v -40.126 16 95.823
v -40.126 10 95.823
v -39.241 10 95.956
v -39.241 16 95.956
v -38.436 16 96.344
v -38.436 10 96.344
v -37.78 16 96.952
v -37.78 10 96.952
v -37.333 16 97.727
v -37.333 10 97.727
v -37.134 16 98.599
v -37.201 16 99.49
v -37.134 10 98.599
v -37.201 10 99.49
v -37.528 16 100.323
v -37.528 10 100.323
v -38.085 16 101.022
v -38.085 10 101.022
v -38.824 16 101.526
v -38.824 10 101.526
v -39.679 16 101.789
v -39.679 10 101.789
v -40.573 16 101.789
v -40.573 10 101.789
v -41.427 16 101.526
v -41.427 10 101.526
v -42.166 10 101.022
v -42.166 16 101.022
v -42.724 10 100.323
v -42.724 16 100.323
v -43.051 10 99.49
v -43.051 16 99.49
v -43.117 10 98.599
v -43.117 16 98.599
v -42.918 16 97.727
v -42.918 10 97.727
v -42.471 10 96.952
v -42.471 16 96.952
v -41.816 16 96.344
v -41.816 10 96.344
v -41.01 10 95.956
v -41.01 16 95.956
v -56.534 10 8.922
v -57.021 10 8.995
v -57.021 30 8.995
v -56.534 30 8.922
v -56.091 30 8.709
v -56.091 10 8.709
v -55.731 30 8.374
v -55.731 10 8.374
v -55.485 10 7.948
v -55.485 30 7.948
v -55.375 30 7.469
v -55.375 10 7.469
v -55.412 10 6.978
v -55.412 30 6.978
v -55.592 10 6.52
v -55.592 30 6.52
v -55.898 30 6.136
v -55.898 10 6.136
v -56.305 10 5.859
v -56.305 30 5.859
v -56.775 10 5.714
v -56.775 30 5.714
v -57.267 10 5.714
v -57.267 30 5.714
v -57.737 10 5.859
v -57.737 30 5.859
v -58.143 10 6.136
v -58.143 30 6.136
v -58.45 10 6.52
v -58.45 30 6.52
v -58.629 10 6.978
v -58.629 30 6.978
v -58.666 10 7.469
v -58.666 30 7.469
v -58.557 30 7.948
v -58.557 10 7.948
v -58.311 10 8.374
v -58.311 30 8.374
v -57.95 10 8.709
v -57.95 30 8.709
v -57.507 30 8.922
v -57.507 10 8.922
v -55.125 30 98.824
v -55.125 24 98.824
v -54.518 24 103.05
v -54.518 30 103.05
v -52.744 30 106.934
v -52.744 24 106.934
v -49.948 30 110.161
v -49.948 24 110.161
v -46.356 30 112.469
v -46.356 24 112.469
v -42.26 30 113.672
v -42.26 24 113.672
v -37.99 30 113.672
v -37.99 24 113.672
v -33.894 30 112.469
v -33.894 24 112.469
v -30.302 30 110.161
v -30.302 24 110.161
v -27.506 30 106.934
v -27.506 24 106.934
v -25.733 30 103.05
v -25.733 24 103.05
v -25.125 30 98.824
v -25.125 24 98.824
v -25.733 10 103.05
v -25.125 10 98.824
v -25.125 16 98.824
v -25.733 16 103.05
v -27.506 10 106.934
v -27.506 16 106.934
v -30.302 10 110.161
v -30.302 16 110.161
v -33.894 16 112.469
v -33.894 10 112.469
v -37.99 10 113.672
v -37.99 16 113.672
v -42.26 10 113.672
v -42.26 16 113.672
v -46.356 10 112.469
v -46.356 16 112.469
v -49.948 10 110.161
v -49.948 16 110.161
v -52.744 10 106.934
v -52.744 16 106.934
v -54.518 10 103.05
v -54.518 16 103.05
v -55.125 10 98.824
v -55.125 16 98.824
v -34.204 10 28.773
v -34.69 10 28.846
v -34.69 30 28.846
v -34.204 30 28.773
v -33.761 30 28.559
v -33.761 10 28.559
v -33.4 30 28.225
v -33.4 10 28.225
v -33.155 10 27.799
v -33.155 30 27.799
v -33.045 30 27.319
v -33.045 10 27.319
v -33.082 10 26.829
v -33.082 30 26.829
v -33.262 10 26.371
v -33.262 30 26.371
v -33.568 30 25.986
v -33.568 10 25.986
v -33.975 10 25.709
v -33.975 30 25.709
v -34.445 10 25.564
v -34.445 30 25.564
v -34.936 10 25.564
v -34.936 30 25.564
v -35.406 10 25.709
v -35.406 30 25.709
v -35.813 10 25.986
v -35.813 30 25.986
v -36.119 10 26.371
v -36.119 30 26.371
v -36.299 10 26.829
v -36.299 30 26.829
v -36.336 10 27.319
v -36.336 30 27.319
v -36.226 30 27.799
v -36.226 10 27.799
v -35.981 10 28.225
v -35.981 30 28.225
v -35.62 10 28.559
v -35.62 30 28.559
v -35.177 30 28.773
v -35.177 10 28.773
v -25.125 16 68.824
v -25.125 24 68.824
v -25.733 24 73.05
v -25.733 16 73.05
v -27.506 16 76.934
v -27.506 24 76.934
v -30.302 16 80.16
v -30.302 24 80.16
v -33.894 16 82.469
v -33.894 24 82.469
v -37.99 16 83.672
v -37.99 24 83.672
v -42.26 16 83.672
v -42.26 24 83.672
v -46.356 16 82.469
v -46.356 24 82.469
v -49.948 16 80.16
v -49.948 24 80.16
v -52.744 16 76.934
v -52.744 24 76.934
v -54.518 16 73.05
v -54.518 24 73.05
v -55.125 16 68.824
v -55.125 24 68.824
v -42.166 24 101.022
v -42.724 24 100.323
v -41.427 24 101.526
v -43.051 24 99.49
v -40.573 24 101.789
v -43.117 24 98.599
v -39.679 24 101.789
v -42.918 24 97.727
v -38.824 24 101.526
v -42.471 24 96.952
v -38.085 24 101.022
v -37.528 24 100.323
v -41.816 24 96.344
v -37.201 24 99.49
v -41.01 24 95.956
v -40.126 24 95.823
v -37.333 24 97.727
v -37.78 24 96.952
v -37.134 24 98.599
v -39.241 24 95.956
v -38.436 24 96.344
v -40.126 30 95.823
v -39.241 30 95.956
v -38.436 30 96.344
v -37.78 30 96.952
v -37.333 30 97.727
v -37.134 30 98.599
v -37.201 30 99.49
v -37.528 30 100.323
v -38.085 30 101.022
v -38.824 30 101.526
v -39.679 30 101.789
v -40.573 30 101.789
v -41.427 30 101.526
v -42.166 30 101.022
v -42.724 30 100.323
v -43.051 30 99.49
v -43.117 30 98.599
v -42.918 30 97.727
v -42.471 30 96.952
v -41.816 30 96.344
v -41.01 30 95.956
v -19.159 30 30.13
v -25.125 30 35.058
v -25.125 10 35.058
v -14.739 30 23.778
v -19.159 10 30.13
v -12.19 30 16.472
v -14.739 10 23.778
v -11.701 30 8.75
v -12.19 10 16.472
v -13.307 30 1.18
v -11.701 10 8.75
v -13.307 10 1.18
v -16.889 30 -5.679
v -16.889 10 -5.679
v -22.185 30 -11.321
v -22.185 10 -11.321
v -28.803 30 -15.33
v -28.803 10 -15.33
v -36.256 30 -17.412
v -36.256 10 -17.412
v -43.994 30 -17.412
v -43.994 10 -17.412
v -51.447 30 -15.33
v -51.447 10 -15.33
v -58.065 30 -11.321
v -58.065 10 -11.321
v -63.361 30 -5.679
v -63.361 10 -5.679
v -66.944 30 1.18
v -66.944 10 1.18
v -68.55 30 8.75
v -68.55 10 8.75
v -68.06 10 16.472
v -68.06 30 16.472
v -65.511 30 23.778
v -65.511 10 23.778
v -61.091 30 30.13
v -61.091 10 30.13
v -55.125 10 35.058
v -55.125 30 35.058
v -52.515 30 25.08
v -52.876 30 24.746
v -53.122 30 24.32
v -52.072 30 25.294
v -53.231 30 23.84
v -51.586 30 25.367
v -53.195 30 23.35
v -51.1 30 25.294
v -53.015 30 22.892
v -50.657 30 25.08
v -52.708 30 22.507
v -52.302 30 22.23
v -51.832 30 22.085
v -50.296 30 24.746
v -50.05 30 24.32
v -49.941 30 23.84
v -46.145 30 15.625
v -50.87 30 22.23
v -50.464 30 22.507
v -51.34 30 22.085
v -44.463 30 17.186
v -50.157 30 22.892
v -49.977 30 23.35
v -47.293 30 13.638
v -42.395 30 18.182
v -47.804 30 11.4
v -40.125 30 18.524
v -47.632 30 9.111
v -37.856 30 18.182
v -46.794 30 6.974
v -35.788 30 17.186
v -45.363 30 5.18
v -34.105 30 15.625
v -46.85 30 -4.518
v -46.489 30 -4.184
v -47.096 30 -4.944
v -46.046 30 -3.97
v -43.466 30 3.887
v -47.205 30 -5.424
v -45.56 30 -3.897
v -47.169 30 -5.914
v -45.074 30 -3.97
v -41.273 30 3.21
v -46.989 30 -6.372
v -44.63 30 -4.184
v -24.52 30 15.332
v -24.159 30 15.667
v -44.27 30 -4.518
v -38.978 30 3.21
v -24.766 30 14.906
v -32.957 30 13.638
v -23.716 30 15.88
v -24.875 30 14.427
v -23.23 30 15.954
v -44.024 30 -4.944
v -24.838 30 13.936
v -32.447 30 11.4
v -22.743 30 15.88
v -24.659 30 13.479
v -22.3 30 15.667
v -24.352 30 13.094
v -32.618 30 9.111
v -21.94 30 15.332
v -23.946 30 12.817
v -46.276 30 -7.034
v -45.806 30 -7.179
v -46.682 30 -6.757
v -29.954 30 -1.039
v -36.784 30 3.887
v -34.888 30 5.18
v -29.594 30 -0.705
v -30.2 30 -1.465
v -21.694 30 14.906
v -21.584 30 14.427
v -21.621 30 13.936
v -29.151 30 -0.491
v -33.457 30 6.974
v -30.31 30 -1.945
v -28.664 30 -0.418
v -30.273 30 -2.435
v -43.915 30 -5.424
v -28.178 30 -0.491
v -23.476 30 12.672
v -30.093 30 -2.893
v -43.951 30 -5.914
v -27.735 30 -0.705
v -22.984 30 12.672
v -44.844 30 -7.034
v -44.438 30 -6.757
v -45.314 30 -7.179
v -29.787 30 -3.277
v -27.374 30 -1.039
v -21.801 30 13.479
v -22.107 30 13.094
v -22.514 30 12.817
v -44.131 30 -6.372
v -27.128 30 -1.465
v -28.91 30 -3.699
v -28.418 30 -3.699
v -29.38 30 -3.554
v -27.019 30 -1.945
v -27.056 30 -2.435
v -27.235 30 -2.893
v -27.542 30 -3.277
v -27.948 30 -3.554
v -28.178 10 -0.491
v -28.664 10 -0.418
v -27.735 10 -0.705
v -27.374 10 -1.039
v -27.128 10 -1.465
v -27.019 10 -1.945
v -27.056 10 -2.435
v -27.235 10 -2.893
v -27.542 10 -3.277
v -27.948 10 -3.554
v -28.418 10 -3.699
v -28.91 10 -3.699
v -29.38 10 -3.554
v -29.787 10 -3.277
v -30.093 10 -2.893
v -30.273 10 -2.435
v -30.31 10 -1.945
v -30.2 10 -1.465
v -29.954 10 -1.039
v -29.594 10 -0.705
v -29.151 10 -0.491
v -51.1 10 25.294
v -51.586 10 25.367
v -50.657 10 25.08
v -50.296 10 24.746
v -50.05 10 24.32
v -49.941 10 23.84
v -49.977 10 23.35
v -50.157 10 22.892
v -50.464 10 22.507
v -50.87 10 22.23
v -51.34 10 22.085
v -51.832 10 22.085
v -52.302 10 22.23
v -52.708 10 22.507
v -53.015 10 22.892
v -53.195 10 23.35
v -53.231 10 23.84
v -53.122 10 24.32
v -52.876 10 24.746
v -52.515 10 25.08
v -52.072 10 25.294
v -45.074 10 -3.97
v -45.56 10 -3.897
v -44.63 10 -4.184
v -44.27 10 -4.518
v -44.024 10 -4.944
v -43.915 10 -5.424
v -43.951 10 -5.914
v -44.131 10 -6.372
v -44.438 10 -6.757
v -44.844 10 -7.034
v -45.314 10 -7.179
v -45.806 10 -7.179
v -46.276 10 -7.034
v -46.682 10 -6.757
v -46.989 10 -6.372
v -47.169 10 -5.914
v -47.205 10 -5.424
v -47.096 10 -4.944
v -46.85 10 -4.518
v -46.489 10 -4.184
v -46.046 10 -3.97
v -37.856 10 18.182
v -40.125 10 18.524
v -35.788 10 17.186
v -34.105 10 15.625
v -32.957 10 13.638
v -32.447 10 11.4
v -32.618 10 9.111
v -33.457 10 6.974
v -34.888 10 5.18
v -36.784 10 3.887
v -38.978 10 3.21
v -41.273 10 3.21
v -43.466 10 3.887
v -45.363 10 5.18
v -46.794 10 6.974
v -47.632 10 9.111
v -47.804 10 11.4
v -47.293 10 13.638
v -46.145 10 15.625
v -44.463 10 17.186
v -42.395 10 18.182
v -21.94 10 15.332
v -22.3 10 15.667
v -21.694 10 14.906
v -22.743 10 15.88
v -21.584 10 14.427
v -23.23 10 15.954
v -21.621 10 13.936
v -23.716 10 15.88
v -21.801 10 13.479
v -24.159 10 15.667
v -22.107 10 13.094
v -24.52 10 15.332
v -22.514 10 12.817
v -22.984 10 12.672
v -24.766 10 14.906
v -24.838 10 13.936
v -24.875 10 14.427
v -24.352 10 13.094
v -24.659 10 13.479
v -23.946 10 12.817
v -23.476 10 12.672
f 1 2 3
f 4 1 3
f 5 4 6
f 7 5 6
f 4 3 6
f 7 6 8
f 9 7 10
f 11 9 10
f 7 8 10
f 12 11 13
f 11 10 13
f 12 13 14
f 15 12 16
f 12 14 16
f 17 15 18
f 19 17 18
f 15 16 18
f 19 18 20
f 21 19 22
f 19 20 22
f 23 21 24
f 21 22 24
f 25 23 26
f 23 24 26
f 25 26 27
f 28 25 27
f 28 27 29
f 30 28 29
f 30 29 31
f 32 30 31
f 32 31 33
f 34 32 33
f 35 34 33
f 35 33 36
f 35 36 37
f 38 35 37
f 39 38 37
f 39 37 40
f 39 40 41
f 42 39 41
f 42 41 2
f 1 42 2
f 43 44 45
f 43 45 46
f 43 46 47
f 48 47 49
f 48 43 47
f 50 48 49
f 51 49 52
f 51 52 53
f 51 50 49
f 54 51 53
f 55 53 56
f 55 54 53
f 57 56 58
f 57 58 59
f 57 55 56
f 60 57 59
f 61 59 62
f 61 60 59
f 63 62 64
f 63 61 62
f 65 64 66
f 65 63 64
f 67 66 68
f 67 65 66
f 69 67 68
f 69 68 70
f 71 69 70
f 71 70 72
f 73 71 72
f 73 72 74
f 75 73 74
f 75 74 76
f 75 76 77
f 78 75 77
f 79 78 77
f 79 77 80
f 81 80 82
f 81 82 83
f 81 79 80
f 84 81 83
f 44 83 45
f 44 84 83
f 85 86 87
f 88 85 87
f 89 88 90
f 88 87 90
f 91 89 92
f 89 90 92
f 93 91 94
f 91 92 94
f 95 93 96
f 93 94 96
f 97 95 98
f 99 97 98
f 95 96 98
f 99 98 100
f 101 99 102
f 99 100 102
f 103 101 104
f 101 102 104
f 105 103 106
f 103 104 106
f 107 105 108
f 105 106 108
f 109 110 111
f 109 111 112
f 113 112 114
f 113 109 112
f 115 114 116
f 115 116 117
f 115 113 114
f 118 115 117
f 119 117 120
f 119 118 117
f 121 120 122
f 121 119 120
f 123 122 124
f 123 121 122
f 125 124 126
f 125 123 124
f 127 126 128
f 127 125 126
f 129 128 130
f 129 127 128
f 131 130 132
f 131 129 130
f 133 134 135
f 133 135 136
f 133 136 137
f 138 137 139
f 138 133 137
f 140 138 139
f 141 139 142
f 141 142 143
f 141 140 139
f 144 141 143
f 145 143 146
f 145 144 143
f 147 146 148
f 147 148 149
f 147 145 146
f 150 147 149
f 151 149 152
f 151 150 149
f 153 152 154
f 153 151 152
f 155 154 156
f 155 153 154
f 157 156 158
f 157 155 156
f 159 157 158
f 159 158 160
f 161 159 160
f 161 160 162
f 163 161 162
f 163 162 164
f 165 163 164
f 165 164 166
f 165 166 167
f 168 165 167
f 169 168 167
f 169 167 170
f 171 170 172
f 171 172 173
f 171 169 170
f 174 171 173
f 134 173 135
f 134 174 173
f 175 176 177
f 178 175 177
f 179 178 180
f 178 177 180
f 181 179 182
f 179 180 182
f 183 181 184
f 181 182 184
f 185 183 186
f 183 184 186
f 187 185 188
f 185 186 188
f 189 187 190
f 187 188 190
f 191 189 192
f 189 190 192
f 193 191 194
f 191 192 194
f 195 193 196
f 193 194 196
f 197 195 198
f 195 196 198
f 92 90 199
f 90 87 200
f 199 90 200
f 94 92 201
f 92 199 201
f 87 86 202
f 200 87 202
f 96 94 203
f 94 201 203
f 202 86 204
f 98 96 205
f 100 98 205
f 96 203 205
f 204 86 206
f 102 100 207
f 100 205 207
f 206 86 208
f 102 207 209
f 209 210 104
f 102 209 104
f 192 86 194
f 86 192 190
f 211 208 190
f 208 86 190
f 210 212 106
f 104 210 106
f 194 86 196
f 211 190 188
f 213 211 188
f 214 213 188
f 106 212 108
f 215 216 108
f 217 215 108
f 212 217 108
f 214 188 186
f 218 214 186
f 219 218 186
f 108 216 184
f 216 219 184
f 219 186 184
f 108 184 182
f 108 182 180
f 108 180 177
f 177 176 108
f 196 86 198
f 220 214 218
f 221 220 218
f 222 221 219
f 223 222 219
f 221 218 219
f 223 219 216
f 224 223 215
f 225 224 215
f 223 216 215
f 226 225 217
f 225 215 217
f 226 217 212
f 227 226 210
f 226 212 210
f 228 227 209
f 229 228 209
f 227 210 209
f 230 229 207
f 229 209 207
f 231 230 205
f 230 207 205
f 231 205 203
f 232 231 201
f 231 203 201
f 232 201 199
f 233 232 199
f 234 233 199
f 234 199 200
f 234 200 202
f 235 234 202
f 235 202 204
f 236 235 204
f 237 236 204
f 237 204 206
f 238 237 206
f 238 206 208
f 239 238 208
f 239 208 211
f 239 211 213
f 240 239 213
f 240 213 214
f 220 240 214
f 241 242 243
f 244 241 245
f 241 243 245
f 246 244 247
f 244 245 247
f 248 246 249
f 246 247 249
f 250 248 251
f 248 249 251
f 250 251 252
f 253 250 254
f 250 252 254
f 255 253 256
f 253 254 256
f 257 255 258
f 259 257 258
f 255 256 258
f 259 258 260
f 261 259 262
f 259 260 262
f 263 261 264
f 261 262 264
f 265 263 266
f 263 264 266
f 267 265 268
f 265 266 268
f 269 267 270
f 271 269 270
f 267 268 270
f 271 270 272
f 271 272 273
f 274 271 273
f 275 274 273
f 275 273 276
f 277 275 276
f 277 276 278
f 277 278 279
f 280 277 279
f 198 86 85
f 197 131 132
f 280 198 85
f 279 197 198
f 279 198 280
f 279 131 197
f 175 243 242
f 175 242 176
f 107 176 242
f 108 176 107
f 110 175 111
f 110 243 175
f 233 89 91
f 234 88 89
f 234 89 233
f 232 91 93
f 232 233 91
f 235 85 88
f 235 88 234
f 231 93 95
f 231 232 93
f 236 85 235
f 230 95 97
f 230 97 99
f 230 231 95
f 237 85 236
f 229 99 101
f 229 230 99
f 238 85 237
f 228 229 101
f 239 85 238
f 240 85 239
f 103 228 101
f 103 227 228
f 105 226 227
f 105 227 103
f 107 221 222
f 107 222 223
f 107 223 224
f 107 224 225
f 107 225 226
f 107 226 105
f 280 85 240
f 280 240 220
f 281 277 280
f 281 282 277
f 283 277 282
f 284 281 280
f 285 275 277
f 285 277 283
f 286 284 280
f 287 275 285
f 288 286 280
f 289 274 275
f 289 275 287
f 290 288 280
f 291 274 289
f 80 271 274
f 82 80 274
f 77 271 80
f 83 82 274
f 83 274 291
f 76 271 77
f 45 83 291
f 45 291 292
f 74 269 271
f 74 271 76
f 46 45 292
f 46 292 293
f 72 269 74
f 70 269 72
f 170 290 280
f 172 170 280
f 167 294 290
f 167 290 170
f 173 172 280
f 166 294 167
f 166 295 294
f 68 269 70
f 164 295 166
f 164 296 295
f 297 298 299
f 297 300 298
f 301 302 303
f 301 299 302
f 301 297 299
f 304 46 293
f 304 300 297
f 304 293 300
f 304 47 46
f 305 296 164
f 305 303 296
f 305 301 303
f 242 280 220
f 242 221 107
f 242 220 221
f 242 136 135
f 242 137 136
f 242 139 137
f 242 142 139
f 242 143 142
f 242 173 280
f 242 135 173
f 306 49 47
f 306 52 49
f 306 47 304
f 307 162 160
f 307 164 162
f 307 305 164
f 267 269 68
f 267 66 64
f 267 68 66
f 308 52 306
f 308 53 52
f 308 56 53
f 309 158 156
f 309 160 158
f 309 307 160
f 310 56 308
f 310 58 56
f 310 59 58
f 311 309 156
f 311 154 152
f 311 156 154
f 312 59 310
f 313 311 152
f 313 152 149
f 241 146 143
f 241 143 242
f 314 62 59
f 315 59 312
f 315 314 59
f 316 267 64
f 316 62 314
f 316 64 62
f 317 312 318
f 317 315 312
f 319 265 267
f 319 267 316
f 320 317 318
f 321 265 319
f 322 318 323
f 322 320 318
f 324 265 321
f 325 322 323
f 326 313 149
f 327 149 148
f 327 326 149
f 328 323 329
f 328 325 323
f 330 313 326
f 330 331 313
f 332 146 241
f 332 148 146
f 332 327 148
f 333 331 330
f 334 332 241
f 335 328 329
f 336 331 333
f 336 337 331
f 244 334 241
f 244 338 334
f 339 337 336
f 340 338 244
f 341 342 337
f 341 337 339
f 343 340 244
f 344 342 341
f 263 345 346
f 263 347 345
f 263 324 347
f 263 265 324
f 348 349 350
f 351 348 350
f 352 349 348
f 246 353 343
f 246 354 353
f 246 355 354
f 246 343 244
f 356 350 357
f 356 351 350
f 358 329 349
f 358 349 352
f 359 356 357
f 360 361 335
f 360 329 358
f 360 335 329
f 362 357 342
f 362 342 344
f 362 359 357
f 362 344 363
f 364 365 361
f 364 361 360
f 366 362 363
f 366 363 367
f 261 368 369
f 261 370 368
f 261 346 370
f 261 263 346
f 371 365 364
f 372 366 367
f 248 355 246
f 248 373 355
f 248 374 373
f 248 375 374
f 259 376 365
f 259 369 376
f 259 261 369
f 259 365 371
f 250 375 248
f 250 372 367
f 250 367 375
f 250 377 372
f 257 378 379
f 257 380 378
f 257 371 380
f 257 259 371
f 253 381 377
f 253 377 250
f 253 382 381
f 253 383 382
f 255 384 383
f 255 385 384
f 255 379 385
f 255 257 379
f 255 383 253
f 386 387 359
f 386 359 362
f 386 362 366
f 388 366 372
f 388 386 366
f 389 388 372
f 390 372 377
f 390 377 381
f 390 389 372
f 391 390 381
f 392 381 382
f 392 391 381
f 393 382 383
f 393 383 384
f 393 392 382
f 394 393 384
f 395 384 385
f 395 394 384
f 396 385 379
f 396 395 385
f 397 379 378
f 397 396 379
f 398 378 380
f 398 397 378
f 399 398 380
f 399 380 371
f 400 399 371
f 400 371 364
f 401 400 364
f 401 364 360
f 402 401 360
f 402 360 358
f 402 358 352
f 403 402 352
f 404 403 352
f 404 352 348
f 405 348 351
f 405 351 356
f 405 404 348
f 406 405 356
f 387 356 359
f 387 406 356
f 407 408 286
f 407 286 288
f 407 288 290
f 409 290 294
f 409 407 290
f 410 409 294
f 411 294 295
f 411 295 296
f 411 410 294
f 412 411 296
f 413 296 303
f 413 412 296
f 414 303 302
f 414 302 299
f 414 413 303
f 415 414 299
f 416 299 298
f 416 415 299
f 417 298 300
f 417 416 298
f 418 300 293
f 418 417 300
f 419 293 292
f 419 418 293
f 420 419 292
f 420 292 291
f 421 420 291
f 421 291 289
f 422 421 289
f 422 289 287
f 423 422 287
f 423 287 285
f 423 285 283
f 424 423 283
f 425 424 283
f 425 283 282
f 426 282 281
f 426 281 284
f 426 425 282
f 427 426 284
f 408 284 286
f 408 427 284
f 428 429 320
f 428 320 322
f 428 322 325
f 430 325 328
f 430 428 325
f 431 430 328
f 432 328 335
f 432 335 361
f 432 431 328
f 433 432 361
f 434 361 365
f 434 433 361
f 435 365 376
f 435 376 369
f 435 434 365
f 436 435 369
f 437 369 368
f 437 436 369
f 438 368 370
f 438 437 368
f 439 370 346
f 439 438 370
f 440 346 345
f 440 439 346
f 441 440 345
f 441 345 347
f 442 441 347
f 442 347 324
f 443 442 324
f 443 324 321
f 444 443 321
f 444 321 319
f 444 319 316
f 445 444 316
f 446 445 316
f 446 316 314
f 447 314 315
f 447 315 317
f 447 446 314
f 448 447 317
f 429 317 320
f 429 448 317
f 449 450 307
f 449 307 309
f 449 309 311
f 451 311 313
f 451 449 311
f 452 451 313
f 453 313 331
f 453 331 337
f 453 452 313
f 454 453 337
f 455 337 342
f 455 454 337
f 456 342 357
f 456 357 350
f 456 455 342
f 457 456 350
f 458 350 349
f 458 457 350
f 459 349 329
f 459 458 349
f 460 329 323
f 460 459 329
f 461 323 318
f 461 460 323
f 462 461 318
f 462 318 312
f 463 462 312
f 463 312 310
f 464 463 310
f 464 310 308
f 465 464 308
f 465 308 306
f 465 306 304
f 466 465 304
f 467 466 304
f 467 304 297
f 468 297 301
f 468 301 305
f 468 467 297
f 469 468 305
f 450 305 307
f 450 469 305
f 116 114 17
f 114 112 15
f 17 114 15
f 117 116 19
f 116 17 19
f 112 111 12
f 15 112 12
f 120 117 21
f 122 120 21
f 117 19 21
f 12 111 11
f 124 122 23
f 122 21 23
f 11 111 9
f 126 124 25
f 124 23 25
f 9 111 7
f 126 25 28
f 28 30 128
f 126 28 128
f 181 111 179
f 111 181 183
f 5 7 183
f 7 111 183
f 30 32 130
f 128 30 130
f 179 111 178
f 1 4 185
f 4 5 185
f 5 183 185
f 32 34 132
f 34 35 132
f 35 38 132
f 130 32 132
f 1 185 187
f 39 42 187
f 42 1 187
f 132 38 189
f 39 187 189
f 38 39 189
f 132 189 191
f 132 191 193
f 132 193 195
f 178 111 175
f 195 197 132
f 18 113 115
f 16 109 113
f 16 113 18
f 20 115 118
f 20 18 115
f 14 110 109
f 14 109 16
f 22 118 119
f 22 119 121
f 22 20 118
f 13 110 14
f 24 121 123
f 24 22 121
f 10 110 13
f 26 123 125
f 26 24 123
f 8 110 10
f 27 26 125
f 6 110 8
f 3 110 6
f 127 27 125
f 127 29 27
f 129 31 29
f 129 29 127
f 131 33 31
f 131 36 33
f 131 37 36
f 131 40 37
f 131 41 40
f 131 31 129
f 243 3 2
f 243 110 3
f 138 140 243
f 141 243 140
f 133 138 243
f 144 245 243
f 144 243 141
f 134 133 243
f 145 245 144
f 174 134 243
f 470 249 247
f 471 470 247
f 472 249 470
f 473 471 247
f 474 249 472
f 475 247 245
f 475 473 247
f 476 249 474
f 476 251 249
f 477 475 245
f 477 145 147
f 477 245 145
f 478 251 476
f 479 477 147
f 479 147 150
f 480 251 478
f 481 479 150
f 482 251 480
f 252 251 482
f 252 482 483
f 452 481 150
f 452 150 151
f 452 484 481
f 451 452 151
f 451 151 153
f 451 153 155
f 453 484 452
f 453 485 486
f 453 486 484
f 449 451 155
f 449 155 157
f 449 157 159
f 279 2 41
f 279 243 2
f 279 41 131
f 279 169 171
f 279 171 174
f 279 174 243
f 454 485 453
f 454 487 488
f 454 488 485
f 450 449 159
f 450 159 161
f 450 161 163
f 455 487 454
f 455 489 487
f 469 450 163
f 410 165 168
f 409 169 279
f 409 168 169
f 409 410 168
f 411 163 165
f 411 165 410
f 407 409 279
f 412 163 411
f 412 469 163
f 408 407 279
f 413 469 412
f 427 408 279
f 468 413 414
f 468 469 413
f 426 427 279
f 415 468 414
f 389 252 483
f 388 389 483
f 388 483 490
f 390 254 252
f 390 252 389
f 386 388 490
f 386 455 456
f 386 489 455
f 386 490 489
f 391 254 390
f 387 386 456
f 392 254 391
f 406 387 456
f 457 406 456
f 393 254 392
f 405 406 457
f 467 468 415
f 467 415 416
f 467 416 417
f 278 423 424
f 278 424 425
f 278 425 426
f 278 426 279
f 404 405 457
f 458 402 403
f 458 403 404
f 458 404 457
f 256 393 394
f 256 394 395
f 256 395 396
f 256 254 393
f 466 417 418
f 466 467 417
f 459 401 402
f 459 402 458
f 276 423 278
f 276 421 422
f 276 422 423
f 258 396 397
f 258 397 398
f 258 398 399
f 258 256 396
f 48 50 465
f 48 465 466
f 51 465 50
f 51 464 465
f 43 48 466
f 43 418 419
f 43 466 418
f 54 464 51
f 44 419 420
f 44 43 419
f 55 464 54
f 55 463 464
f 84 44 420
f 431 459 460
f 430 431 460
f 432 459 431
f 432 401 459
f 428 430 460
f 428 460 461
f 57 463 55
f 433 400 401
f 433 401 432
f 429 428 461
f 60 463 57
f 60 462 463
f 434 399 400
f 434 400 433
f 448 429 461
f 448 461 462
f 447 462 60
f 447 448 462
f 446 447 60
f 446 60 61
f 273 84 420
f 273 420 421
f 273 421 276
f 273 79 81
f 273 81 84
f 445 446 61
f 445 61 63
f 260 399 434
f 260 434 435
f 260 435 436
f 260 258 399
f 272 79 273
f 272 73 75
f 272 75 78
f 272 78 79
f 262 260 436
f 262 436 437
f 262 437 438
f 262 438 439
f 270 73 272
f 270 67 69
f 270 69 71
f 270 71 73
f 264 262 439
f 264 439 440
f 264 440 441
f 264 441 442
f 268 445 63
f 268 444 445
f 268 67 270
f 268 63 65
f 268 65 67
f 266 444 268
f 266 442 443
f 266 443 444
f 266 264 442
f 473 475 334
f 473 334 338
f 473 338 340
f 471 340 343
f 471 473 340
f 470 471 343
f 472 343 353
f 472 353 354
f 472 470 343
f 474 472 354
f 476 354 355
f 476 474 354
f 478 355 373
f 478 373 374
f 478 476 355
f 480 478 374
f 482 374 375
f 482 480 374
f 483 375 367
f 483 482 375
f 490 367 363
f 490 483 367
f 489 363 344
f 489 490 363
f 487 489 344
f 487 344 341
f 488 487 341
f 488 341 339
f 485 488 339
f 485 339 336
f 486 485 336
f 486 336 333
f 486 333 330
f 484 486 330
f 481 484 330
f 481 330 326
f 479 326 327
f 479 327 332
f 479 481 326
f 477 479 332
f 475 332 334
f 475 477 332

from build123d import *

# Parameters (mm, degrees)
SKETCH_2_R          = 28.5
SKETCH_2_R_2        = 1.65
SKETCH_2_R_3        = 7.7
EXTRUDE_2_DEPTH     = 20
EXTRUDE_START       = -6
EXTRUDE_3_DEPTH     = 6
EXTRUDE_START_2     = 8
EXTRUDE_4_DEPTH     = 8
EXTRUDE_START_3     = 6
EXTRUDE_5_DEPTH     = 6
SKETCH_7_R          = 3
CUT_EXTRUDE_4_DEPTH = 20


with BuildPart() as part:
    # 草图2 → 凸台-拉伸2 (new body)
    with BuildSketch(Plane(origin=(0, 10, 0), x_dir=(0, 0, -1), z_dir=(0, 1, 0))):
        with Locations((-10.824457271, 40.125190792)):
            Circle(SKETCH_2_R)
        with Locations((-14.303615873, 23.229689751)):
            Circle(SKETCH_2_R_2, mode=Mode.SUBTRACT)
        with Locations((-27.195969683, 34.690480004)):
            Circle(SKETCH_2_R_2, mode=Mode.SUBTRACT)
        with Locations((2.067896539, 28.664400538)):
            Circle(SKETCH_2_R_2, mode=Mode.SUBTRACT)
        with Locations((-23.716811081, 51.585981045)):
            Circle(SKETCH_2_R_2, mode=Mode.SUBTRACT)
        with Locations((-10.824457271, 40.125190792)):
            Circle(SKETCH_2_R_3, mode=Mode.SUBTRACT)
        with Locations((5.547055141, 45.559901579)):
            Circle(SKETCH_2_R_2, mode=Mode.SUBTRACT)
        with Locations((-7.345298669, 57.020691832)):
            Circle(SKETCH_2_R_2, mode=Mode.SUBTRACT)
    extrude(amount=EXTRUDE_2_DEPTH)

    # 草图3 → 凸台-拉伸3 (add)
    with BuildSketch(Plane(origin=(0, 30, 0), x_dir=(1, 0, 0), z_dir=(0, 1, 0)).offset(EXTRUDE_START)):
        with BuildLine():
            ThreePointArc((-25.125190792, -35.057698903), (-40.125190792, -39.324457271), (-55.125190792, -35.057698903))
            Line((-55.125190792, -35.057698903), (-55.125190792, -98.824457271))
            ThreePointArc((-55.125190792, -98.824457271), (-40.125190792, -113.824457271), (-25.125190792, -98.824457271))
            Line((-25.125190792, -98.824457271), (-25.125190792, -35.057698903))
        make_face()
    extrude(amount=EXTRUDE_3_DEPTH)

    # 草图5 → 凸台-拉伸4 (add)
    with BuildSketch(Plane(origin=(0, 24, 0), x_dir=(-1, 0, 0), z_dir=(0, -1, 0)).offset(EXTRUDE_START_2)):
        with BuildLine():
            Line((55.125190792, -68.824205807), (55.125190792, -35.057698903))
            ThreePointArc((55.125190792, -35.057698903), (40.125190792, -39.324457271), (25.125190792, -35.057698903))
            Line((25.125190792, -35.057698903), (25.125190792, -68.824205807))
            ThreePointArc((25.125190792, -68.824205807), (40.125190792, -83.824205807), (55.125190792, -68.824205807))
        make_face()
    extrude(amount=-EXTRUDE_4_DEPTH)

    # 草图6 → 凸台-拉伸5 (add)
    with BuildSketch(Plane(origin=(0, 16, 0), x_dir=(-1, 0, 0), z_dir=(0, -1, 0)).offset(EXTRUDE_START_3)):
        with BuildLine():
            ThreePointArc((55.125190792, -35.057698903), (40.125190792, -39.324457271), (25.125190792, -35.057698903))
            Line((25.125190792, -35.057698903), (25.125190792, -98.824457271))
            ThreePointArc((25.125190792, -98.824457271), (40.125190792, -113.824457271), (55.125190792, -98.824457271))
            Line((55.125190792, -98.824457271), (55.125190792, -35.057698903))
        make_face()
    extrude(amount=-EXTRUDE_5_DEPTH)

    # 草图7 → 切除-拉伸4 (cut)
    with BuildSketch(Plane(origin=(0, 10, 0), x_dir=(-1, 0, 0), z_dir=(0, -1, 0))):
        with Locations((40.125725395, -98.822710565)):
            Circle(SKETCH_7_R)
    extrude(amount=-CUT_EXTRUDE_4_DEPTH, mode=Mode.SUBTRACT)


solid = part.part
